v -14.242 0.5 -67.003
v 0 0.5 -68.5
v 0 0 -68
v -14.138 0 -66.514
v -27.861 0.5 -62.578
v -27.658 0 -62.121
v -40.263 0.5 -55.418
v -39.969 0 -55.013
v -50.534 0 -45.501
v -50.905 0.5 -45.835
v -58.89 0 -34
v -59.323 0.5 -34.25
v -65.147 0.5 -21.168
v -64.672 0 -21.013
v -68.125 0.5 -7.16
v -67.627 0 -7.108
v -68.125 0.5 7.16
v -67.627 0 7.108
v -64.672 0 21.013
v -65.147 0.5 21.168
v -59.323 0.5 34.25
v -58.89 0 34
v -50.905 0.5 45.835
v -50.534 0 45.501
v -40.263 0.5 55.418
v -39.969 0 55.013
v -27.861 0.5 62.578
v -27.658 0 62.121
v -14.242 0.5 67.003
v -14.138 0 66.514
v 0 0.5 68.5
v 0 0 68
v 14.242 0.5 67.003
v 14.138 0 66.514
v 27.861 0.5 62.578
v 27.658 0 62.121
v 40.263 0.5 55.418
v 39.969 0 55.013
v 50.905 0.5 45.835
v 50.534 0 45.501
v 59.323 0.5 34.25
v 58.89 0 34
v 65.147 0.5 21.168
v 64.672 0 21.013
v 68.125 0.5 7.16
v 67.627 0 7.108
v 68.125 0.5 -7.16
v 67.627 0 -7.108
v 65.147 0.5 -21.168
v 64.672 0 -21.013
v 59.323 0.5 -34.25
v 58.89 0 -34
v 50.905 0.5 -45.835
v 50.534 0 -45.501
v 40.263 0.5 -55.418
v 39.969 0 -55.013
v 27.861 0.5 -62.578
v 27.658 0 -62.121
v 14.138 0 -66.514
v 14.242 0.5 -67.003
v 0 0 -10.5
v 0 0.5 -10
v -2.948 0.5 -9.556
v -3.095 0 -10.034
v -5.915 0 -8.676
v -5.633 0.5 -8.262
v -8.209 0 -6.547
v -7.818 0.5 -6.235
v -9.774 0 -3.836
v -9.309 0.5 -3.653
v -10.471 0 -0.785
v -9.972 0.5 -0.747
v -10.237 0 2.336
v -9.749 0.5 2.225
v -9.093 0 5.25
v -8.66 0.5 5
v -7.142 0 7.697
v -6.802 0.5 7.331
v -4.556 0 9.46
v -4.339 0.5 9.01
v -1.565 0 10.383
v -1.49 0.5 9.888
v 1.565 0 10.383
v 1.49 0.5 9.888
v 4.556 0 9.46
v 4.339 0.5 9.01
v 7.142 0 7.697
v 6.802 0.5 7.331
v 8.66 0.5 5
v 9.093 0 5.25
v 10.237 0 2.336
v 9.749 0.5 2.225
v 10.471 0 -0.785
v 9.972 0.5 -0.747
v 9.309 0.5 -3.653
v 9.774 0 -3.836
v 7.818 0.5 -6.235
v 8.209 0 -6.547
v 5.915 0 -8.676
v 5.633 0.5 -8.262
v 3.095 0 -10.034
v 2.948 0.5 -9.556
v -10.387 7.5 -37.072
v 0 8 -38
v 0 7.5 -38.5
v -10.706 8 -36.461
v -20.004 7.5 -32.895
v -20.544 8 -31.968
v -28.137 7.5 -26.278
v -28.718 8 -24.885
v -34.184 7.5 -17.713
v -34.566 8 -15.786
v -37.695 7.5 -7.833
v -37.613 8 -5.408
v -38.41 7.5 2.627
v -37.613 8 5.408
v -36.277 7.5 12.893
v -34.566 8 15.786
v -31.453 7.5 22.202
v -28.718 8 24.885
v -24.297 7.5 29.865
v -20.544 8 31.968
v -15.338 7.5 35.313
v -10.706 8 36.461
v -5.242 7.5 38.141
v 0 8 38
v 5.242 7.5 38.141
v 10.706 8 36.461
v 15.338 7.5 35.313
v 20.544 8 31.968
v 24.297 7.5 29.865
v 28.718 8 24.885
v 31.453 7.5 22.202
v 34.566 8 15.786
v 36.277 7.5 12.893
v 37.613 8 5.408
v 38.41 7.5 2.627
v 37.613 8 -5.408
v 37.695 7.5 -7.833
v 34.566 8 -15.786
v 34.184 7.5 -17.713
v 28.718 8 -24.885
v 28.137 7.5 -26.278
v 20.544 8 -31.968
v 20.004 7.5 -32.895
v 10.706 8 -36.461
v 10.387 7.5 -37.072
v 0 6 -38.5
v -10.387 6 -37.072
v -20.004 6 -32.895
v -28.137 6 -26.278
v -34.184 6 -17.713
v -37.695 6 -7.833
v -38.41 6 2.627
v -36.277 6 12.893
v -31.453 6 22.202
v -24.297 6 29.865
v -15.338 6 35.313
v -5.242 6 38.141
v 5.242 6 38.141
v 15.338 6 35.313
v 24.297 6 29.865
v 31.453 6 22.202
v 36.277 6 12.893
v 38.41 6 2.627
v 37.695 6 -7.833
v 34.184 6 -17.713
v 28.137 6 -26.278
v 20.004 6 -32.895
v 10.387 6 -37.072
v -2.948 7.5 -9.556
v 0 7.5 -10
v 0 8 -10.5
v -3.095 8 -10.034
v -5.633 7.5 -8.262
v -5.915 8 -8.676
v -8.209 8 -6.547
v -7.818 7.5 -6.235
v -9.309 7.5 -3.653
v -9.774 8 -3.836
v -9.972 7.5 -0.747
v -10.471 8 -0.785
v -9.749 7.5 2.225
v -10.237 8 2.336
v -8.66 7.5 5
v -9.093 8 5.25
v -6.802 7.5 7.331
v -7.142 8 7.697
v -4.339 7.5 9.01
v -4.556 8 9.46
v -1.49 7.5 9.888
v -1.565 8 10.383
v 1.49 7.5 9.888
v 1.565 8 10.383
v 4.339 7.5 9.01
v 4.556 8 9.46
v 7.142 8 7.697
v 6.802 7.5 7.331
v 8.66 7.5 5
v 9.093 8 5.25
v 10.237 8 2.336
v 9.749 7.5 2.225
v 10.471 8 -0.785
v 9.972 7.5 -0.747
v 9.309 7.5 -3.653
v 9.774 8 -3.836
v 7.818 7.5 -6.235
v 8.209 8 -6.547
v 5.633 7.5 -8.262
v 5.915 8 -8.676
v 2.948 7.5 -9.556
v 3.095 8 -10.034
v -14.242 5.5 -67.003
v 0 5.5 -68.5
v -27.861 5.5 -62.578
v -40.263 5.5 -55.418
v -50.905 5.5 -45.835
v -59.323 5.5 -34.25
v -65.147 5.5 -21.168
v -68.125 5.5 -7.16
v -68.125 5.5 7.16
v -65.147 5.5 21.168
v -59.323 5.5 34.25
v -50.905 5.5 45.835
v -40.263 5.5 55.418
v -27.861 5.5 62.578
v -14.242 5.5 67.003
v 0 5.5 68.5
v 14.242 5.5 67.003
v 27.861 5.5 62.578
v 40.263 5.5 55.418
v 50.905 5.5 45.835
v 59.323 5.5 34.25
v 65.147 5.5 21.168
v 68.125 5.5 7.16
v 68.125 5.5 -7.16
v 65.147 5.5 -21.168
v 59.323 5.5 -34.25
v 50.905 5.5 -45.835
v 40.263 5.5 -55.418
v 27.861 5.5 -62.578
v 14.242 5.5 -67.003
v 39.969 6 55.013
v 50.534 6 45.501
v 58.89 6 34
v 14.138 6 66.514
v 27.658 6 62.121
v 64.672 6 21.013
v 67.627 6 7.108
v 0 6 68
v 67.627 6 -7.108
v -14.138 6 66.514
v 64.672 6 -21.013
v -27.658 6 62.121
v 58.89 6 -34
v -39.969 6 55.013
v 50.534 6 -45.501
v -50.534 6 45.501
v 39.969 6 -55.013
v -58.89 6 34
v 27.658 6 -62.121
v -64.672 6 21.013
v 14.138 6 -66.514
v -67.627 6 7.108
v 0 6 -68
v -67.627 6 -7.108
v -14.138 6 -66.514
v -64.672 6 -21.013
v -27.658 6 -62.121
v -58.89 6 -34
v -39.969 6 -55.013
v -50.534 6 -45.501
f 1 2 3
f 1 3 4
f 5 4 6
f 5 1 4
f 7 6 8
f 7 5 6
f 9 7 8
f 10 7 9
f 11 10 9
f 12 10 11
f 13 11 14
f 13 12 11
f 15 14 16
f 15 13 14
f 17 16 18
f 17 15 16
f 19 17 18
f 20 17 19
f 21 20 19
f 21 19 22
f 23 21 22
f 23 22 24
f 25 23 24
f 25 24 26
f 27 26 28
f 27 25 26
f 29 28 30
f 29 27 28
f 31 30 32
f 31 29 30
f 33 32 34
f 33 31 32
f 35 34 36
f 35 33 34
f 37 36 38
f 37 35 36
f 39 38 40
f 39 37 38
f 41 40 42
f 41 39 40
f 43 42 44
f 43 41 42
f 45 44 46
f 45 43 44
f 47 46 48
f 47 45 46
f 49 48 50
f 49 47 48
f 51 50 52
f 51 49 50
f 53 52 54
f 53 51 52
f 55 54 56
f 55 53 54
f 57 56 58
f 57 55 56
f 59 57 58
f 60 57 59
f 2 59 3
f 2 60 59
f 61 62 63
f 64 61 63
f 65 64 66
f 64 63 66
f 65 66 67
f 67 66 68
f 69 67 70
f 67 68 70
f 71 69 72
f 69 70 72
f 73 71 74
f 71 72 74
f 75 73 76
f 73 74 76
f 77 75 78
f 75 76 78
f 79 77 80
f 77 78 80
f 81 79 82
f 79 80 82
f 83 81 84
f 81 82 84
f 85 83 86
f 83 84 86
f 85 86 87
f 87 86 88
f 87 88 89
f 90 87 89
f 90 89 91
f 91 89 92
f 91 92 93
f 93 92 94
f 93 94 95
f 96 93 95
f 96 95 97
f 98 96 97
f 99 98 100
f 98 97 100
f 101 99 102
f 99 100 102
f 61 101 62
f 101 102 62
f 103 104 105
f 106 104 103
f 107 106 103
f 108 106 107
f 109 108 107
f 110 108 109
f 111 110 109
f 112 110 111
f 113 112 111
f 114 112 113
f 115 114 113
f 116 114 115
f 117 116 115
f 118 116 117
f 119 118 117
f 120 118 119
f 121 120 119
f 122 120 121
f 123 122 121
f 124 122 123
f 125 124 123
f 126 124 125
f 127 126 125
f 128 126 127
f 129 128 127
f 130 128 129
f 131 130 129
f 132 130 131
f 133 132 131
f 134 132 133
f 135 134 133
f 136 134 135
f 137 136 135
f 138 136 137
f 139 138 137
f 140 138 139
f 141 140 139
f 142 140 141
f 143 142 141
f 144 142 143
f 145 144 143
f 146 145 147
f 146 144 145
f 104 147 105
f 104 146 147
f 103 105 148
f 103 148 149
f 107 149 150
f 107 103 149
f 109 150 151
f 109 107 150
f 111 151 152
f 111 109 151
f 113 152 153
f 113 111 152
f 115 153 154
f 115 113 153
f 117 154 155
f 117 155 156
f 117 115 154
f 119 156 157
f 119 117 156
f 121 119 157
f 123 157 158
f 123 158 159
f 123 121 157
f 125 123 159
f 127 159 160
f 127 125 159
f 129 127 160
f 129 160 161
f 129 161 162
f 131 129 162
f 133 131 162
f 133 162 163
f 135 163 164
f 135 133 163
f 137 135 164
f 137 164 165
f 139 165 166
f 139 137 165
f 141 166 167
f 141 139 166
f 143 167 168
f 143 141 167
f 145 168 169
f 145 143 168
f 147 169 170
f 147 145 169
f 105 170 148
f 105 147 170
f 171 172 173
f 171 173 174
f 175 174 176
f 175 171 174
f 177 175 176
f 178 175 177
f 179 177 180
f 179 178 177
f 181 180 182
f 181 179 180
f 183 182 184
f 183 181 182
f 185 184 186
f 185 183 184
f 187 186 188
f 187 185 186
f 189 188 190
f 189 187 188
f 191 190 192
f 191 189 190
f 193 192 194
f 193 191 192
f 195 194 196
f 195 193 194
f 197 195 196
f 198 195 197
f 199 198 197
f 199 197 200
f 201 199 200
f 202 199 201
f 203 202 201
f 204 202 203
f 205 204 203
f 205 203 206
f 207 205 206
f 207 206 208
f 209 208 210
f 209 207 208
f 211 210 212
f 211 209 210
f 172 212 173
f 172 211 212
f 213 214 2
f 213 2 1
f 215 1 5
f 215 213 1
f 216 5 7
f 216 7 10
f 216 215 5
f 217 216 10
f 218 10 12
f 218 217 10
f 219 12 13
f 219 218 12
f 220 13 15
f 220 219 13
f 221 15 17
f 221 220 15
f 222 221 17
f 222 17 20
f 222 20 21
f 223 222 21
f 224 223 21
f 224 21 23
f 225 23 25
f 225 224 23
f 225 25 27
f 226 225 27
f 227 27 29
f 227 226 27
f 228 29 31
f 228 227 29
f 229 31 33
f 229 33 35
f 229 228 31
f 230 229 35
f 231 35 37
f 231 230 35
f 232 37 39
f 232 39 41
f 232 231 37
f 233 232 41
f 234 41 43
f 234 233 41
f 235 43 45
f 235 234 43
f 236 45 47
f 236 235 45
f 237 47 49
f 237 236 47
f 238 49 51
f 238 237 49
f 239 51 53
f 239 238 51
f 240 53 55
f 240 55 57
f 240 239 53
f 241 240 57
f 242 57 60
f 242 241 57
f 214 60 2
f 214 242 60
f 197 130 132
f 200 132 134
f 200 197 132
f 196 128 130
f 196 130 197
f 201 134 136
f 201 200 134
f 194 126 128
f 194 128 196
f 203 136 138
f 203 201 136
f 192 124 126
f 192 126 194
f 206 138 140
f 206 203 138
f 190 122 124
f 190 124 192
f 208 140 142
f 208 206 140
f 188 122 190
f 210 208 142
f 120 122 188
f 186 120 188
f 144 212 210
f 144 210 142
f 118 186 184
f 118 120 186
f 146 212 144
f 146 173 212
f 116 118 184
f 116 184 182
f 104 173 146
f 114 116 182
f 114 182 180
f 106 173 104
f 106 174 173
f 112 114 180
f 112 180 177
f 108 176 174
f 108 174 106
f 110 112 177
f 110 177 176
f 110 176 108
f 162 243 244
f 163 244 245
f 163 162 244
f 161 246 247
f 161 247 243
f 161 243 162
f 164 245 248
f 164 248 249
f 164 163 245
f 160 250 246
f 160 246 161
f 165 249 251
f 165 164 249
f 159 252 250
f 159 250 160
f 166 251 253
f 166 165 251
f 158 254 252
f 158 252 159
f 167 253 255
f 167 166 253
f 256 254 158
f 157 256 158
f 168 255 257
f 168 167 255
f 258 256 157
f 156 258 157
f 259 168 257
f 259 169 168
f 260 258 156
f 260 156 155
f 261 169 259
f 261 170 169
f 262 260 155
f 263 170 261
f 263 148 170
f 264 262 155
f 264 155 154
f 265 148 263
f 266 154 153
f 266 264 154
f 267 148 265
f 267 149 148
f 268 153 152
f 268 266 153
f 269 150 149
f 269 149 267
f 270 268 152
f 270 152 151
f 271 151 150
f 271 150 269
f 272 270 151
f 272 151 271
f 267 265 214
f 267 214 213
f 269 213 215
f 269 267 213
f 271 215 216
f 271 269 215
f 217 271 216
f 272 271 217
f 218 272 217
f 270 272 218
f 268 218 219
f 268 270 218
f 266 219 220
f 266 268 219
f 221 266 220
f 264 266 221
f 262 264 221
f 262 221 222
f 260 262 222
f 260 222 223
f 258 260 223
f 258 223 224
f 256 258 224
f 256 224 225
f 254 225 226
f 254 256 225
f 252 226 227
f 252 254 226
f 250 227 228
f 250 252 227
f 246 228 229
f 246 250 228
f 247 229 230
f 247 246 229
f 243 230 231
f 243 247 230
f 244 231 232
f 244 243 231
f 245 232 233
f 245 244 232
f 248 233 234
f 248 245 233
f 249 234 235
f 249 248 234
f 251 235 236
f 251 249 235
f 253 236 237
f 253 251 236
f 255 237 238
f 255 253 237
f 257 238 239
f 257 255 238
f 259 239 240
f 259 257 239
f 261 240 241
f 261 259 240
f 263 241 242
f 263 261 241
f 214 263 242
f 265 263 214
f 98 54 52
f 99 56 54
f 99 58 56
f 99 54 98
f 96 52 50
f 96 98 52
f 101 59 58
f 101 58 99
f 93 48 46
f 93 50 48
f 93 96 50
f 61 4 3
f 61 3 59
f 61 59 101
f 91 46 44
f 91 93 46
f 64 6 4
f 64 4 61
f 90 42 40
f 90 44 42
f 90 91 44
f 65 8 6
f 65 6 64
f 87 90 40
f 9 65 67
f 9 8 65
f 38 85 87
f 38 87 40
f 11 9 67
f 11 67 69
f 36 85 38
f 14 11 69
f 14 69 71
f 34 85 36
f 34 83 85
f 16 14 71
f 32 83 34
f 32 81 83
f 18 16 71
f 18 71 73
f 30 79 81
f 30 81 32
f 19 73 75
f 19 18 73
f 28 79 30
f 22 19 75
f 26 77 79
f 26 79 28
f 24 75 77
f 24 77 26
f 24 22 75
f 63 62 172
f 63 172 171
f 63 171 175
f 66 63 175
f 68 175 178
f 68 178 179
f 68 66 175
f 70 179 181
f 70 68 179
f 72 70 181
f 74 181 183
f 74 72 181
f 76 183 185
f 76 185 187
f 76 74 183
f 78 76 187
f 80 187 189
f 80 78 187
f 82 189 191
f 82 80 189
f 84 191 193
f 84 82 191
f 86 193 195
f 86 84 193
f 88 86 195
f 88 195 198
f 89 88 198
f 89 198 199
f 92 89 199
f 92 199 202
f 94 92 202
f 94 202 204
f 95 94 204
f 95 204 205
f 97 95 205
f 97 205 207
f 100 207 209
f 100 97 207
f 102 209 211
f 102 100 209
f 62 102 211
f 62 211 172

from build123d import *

# Parameters (mm, degrees)
CHAMFER_1_SIZE = 0.5


with BuildPart() as part:
    # 草图2 → 旋转1 (revolve)
    with BuildSketch(Plane(origin=(0, 0, 0), x_dir=(0, 0, -1), z_dir=(1, 0, 0))):
        Polygon((10, 0), (68.5, 0), (68.5, 6), (38.5, 6), (38.5, 8), (10, 8), align=None)
    revolve(axis=Axis((0, 0, 0), (0, 1, 0)))

    # 倒角1
    chamfer_1_edges = [part.edges().sort_by_distance(p)[0] for p in [
        (0, 0, 68.5),
        (0, 0, 10),
        (0, 8, 10),
        (0, 8, 38.5),
        (0, 6, 68.5),
    ]]
    chamfer(chamfer_1_edges, length=CHAMFER_1_SIZE)


solid = part.part
